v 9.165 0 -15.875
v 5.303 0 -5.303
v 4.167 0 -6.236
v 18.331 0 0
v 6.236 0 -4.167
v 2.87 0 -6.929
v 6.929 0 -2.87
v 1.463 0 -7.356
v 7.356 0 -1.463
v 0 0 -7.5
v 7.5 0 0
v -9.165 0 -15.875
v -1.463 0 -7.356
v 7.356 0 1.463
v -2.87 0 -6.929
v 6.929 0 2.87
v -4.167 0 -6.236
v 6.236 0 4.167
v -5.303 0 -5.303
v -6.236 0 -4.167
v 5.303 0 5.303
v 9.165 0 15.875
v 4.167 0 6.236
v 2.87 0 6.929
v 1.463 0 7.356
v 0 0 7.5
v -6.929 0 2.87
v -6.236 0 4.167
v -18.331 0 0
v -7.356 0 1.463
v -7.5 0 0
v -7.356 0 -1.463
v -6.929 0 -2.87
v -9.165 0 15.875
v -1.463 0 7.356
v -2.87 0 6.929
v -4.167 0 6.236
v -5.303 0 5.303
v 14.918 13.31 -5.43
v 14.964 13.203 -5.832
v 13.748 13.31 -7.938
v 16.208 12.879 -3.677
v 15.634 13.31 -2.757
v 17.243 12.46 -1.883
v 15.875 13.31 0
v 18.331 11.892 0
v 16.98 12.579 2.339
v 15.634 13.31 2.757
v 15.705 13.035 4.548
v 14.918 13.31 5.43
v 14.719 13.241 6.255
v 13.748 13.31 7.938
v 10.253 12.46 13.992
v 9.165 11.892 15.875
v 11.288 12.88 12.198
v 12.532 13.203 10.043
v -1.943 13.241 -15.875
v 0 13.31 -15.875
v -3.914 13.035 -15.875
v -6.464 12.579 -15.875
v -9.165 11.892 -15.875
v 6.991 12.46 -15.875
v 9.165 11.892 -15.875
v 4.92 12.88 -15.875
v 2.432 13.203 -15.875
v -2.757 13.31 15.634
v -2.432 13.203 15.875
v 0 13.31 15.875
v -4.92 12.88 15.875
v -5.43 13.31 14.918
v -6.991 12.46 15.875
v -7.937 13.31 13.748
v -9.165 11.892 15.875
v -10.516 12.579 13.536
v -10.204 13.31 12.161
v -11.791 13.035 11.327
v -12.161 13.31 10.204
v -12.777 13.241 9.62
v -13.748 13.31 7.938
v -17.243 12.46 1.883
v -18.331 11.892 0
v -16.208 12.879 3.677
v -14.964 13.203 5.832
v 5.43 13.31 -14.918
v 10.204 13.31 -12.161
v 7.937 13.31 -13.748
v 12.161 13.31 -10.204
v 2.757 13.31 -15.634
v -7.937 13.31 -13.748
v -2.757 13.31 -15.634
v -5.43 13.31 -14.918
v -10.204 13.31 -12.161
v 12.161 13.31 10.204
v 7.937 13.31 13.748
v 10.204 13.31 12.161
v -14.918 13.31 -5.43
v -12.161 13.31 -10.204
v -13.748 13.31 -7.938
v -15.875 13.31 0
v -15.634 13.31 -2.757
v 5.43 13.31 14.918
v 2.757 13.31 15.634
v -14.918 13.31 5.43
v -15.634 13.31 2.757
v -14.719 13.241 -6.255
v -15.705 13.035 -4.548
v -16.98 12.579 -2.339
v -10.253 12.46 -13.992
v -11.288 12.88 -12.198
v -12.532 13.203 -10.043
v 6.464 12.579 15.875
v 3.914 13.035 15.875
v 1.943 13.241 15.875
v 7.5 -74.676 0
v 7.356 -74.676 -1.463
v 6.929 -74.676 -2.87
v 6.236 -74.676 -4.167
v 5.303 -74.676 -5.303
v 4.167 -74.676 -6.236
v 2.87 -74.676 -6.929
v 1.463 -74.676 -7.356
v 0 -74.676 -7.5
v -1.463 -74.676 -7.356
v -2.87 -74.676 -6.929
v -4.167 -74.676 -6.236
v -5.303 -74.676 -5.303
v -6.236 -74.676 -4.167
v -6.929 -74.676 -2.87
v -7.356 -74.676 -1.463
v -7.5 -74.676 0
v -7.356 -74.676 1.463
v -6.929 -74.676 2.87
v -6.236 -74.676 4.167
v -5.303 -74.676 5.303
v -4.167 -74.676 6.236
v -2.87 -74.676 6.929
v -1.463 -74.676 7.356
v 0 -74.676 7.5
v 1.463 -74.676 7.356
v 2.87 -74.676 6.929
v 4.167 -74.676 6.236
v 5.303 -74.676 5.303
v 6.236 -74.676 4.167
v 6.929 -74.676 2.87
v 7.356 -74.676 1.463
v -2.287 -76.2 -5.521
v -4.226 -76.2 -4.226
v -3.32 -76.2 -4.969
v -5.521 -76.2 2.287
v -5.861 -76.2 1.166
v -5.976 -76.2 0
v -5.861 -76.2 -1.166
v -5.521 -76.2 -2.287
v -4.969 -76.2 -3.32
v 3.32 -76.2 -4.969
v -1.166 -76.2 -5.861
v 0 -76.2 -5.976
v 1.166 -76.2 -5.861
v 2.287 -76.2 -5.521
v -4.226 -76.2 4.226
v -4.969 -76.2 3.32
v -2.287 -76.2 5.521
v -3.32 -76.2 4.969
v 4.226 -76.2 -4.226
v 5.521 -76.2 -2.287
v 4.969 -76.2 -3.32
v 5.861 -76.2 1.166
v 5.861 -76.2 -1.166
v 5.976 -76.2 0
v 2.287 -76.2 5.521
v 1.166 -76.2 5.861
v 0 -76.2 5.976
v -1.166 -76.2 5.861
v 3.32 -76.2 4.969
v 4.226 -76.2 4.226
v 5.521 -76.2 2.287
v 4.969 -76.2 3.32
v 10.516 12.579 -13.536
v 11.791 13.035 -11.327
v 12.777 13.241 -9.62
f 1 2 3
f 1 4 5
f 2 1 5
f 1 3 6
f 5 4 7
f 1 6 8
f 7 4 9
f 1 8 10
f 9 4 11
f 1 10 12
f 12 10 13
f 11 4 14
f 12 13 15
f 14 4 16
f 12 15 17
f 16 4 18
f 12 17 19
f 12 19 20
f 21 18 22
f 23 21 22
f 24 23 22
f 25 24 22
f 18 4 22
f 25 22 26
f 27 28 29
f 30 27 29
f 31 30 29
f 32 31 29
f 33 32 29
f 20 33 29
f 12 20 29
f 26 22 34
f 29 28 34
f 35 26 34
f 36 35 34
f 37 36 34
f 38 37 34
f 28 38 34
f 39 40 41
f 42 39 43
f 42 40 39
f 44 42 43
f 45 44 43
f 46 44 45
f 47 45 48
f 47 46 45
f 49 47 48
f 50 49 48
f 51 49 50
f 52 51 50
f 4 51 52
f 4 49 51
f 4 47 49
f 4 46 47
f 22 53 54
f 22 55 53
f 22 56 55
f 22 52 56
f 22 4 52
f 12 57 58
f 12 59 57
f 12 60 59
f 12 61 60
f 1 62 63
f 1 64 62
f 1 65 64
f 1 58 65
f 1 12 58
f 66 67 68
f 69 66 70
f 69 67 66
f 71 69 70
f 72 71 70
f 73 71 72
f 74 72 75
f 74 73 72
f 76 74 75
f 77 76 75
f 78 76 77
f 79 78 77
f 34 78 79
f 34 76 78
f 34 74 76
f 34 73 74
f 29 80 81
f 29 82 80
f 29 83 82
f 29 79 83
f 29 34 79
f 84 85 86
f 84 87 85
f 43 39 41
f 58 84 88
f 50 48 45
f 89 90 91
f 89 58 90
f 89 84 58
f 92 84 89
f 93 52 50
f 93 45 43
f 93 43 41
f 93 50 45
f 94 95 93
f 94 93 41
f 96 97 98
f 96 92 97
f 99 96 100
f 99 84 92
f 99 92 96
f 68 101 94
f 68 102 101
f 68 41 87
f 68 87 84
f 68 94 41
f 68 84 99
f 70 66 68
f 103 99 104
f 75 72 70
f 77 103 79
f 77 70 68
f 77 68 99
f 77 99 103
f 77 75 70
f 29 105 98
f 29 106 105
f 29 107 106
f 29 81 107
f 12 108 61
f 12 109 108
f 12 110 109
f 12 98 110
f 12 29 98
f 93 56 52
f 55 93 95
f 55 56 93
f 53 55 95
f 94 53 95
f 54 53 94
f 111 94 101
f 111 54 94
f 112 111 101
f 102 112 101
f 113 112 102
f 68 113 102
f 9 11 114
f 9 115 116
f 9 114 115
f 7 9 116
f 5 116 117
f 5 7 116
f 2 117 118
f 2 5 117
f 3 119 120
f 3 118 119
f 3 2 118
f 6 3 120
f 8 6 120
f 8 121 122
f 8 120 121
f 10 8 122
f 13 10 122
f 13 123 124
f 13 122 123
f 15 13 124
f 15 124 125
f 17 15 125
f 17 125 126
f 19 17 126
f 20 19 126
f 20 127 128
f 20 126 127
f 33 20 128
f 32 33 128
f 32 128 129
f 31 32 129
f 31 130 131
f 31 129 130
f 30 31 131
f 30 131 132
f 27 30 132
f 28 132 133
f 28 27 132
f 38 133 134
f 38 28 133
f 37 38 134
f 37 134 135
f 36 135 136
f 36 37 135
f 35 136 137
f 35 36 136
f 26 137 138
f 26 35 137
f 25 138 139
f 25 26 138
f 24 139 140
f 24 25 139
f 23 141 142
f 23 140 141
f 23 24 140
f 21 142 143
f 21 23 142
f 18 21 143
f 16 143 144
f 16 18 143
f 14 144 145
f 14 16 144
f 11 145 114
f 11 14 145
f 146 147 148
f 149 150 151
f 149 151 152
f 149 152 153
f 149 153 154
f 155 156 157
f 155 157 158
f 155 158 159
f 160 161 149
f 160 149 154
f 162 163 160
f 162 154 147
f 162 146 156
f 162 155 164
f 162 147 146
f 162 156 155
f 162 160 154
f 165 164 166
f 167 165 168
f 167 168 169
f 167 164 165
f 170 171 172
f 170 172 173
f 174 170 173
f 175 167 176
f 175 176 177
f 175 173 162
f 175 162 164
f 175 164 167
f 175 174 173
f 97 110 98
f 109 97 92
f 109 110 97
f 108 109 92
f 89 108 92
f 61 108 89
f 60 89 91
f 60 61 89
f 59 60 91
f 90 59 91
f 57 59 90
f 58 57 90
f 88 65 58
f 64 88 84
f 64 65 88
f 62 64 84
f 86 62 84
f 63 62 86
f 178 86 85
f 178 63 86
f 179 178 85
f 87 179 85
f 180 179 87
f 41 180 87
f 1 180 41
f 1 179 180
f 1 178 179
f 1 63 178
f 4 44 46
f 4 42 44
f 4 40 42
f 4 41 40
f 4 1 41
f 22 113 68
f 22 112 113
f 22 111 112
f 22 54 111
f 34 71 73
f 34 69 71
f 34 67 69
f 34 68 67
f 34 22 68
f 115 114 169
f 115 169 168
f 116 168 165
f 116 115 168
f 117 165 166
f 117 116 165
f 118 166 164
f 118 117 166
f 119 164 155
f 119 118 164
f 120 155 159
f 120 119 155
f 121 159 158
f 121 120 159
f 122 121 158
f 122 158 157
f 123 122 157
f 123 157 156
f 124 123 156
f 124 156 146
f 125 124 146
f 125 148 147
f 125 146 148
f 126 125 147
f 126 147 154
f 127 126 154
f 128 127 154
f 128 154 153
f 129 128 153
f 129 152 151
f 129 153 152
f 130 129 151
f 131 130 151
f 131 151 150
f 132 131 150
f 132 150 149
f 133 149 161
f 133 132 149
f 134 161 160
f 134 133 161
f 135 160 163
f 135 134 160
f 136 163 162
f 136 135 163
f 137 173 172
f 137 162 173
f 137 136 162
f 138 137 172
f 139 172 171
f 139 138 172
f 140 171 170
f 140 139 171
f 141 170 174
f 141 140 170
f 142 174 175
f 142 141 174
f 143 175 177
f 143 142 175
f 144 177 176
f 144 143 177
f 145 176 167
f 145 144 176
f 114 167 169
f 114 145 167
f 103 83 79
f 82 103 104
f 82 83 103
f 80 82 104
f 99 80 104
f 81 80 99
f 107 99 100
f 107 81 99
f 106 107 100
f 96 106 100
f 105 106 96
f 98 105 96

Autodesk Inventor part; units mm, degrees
ref_plane "YZ Plane" through (0, 0, 0) normal (1, 0, 0) x (0, 1, 0)
ref_plane "XZ Plane" through (0, 0, 0) normal (0, 1, 0) x (-1, 0, 0)
ref_plane "XY Plane" through (0, 0, 0) normal (0, 0, 1) x (1, 0, 0)
sketch "Sketch1" plane through (0, 0, 0) normal (0, 1, 0) x (-1, 0, 0)
  line L0 (9.1654, 15.875) -> (18.3309, 0)
  line L1 (18.3309, 0) -> (9.1654, -15.875)
  line L2 (9.1654, -15.875) -> (-9.1654, -15.875)
  line L3 (-9.1654, -15.875) -> (-18.3309, 0)
  line L4 (-18.3309, 0) -> (-9.1654, 15.875)
  line L5 (-9.1654, 15.875) -> (9.1654, 15.875)
  point P0 (0, 0)
  point P1 (0, 0)
  dimension "HEX_FLATS" = 31.75
extrude "Extrusion1" add sketch "Sketch1" along normal blind 13.3096
sketch "Sketch2" plane through (0, 0, 0) normal (0, 0, 1) x (1, 0, 0)
  line L0 (9.1654, 13.3096) -> (18.3309, 13.3096) projected
  line L1 (15.875, 13.3096) -> (28.575, 5.9773)
  line L2 (28.575, 5.9773) -> (28.575, 18.6773)
  line L3 (28.575, 18.6773) -> (15.875, 18.6773)
  line L4 (15.875, 18.6773) -> (15.875, 13.3096)
  line L5 (0, 26.9922) -> (0, -31.2125) projected
  line L6 (0, 0) -> (0, -22.8975)
  dimension "d3" = 30
  dimension "HD_CHAMFER" = 15.875
  dimension "d5" = 12.7
  dimension "d6" = 12.7
revolve "Revolution1" cut sketch "Sketch2" angle 360 about axis through (0, 0, 0) along (0, -1, 0)
sketch "Sketch3" plane through (0, 0, 0) normal (0, -1, 0) x (1, 0, 0)
  circle A0 centre (0, 0) radius 7.5
  dimension "BOLT_SIZE" = 15
extrude "Extrusion2" add sketch "Sketch3" along normal blind 76.2
chamfer "Chamfer1" distance 1.524 angle 45 1 edges at (-7.5, -76.2, 0)
thread "Thread 1/2\"" size "1/2-13 UNC" class "2A" standard "ANSI Unified Screw Threads" length 0
thread "Thread 5/8\"" size "5/8-11 UNC" class "2A" standard "ANSI Unified Screw Threads" length 0
thread "Thread-3/4\"" size "3/4-10 UNC" class "2A" standard "ANSI Unified Screw Threads" length 44.45
thread "Thread 7/8\"" size "7/8-9 UNC" class "2A" standard "ANSI Unified Screw Threads" length 0
thread "Thread 1\"" size "1-8 UNC" class "2A" standard "ANSI Unified Screw Threads" length 0
thread "Thread 1 1/8\"" size "1 1/8-7 UNC" class "2A" standard "ANSI Unified Screw Threads" length 0
thread "Thread 1 1/4\"" size "1 1/4-7 UNC" class "2A" standard "ANSI Unified Screw Threads" length 0
properties material "Stainless Steel"
